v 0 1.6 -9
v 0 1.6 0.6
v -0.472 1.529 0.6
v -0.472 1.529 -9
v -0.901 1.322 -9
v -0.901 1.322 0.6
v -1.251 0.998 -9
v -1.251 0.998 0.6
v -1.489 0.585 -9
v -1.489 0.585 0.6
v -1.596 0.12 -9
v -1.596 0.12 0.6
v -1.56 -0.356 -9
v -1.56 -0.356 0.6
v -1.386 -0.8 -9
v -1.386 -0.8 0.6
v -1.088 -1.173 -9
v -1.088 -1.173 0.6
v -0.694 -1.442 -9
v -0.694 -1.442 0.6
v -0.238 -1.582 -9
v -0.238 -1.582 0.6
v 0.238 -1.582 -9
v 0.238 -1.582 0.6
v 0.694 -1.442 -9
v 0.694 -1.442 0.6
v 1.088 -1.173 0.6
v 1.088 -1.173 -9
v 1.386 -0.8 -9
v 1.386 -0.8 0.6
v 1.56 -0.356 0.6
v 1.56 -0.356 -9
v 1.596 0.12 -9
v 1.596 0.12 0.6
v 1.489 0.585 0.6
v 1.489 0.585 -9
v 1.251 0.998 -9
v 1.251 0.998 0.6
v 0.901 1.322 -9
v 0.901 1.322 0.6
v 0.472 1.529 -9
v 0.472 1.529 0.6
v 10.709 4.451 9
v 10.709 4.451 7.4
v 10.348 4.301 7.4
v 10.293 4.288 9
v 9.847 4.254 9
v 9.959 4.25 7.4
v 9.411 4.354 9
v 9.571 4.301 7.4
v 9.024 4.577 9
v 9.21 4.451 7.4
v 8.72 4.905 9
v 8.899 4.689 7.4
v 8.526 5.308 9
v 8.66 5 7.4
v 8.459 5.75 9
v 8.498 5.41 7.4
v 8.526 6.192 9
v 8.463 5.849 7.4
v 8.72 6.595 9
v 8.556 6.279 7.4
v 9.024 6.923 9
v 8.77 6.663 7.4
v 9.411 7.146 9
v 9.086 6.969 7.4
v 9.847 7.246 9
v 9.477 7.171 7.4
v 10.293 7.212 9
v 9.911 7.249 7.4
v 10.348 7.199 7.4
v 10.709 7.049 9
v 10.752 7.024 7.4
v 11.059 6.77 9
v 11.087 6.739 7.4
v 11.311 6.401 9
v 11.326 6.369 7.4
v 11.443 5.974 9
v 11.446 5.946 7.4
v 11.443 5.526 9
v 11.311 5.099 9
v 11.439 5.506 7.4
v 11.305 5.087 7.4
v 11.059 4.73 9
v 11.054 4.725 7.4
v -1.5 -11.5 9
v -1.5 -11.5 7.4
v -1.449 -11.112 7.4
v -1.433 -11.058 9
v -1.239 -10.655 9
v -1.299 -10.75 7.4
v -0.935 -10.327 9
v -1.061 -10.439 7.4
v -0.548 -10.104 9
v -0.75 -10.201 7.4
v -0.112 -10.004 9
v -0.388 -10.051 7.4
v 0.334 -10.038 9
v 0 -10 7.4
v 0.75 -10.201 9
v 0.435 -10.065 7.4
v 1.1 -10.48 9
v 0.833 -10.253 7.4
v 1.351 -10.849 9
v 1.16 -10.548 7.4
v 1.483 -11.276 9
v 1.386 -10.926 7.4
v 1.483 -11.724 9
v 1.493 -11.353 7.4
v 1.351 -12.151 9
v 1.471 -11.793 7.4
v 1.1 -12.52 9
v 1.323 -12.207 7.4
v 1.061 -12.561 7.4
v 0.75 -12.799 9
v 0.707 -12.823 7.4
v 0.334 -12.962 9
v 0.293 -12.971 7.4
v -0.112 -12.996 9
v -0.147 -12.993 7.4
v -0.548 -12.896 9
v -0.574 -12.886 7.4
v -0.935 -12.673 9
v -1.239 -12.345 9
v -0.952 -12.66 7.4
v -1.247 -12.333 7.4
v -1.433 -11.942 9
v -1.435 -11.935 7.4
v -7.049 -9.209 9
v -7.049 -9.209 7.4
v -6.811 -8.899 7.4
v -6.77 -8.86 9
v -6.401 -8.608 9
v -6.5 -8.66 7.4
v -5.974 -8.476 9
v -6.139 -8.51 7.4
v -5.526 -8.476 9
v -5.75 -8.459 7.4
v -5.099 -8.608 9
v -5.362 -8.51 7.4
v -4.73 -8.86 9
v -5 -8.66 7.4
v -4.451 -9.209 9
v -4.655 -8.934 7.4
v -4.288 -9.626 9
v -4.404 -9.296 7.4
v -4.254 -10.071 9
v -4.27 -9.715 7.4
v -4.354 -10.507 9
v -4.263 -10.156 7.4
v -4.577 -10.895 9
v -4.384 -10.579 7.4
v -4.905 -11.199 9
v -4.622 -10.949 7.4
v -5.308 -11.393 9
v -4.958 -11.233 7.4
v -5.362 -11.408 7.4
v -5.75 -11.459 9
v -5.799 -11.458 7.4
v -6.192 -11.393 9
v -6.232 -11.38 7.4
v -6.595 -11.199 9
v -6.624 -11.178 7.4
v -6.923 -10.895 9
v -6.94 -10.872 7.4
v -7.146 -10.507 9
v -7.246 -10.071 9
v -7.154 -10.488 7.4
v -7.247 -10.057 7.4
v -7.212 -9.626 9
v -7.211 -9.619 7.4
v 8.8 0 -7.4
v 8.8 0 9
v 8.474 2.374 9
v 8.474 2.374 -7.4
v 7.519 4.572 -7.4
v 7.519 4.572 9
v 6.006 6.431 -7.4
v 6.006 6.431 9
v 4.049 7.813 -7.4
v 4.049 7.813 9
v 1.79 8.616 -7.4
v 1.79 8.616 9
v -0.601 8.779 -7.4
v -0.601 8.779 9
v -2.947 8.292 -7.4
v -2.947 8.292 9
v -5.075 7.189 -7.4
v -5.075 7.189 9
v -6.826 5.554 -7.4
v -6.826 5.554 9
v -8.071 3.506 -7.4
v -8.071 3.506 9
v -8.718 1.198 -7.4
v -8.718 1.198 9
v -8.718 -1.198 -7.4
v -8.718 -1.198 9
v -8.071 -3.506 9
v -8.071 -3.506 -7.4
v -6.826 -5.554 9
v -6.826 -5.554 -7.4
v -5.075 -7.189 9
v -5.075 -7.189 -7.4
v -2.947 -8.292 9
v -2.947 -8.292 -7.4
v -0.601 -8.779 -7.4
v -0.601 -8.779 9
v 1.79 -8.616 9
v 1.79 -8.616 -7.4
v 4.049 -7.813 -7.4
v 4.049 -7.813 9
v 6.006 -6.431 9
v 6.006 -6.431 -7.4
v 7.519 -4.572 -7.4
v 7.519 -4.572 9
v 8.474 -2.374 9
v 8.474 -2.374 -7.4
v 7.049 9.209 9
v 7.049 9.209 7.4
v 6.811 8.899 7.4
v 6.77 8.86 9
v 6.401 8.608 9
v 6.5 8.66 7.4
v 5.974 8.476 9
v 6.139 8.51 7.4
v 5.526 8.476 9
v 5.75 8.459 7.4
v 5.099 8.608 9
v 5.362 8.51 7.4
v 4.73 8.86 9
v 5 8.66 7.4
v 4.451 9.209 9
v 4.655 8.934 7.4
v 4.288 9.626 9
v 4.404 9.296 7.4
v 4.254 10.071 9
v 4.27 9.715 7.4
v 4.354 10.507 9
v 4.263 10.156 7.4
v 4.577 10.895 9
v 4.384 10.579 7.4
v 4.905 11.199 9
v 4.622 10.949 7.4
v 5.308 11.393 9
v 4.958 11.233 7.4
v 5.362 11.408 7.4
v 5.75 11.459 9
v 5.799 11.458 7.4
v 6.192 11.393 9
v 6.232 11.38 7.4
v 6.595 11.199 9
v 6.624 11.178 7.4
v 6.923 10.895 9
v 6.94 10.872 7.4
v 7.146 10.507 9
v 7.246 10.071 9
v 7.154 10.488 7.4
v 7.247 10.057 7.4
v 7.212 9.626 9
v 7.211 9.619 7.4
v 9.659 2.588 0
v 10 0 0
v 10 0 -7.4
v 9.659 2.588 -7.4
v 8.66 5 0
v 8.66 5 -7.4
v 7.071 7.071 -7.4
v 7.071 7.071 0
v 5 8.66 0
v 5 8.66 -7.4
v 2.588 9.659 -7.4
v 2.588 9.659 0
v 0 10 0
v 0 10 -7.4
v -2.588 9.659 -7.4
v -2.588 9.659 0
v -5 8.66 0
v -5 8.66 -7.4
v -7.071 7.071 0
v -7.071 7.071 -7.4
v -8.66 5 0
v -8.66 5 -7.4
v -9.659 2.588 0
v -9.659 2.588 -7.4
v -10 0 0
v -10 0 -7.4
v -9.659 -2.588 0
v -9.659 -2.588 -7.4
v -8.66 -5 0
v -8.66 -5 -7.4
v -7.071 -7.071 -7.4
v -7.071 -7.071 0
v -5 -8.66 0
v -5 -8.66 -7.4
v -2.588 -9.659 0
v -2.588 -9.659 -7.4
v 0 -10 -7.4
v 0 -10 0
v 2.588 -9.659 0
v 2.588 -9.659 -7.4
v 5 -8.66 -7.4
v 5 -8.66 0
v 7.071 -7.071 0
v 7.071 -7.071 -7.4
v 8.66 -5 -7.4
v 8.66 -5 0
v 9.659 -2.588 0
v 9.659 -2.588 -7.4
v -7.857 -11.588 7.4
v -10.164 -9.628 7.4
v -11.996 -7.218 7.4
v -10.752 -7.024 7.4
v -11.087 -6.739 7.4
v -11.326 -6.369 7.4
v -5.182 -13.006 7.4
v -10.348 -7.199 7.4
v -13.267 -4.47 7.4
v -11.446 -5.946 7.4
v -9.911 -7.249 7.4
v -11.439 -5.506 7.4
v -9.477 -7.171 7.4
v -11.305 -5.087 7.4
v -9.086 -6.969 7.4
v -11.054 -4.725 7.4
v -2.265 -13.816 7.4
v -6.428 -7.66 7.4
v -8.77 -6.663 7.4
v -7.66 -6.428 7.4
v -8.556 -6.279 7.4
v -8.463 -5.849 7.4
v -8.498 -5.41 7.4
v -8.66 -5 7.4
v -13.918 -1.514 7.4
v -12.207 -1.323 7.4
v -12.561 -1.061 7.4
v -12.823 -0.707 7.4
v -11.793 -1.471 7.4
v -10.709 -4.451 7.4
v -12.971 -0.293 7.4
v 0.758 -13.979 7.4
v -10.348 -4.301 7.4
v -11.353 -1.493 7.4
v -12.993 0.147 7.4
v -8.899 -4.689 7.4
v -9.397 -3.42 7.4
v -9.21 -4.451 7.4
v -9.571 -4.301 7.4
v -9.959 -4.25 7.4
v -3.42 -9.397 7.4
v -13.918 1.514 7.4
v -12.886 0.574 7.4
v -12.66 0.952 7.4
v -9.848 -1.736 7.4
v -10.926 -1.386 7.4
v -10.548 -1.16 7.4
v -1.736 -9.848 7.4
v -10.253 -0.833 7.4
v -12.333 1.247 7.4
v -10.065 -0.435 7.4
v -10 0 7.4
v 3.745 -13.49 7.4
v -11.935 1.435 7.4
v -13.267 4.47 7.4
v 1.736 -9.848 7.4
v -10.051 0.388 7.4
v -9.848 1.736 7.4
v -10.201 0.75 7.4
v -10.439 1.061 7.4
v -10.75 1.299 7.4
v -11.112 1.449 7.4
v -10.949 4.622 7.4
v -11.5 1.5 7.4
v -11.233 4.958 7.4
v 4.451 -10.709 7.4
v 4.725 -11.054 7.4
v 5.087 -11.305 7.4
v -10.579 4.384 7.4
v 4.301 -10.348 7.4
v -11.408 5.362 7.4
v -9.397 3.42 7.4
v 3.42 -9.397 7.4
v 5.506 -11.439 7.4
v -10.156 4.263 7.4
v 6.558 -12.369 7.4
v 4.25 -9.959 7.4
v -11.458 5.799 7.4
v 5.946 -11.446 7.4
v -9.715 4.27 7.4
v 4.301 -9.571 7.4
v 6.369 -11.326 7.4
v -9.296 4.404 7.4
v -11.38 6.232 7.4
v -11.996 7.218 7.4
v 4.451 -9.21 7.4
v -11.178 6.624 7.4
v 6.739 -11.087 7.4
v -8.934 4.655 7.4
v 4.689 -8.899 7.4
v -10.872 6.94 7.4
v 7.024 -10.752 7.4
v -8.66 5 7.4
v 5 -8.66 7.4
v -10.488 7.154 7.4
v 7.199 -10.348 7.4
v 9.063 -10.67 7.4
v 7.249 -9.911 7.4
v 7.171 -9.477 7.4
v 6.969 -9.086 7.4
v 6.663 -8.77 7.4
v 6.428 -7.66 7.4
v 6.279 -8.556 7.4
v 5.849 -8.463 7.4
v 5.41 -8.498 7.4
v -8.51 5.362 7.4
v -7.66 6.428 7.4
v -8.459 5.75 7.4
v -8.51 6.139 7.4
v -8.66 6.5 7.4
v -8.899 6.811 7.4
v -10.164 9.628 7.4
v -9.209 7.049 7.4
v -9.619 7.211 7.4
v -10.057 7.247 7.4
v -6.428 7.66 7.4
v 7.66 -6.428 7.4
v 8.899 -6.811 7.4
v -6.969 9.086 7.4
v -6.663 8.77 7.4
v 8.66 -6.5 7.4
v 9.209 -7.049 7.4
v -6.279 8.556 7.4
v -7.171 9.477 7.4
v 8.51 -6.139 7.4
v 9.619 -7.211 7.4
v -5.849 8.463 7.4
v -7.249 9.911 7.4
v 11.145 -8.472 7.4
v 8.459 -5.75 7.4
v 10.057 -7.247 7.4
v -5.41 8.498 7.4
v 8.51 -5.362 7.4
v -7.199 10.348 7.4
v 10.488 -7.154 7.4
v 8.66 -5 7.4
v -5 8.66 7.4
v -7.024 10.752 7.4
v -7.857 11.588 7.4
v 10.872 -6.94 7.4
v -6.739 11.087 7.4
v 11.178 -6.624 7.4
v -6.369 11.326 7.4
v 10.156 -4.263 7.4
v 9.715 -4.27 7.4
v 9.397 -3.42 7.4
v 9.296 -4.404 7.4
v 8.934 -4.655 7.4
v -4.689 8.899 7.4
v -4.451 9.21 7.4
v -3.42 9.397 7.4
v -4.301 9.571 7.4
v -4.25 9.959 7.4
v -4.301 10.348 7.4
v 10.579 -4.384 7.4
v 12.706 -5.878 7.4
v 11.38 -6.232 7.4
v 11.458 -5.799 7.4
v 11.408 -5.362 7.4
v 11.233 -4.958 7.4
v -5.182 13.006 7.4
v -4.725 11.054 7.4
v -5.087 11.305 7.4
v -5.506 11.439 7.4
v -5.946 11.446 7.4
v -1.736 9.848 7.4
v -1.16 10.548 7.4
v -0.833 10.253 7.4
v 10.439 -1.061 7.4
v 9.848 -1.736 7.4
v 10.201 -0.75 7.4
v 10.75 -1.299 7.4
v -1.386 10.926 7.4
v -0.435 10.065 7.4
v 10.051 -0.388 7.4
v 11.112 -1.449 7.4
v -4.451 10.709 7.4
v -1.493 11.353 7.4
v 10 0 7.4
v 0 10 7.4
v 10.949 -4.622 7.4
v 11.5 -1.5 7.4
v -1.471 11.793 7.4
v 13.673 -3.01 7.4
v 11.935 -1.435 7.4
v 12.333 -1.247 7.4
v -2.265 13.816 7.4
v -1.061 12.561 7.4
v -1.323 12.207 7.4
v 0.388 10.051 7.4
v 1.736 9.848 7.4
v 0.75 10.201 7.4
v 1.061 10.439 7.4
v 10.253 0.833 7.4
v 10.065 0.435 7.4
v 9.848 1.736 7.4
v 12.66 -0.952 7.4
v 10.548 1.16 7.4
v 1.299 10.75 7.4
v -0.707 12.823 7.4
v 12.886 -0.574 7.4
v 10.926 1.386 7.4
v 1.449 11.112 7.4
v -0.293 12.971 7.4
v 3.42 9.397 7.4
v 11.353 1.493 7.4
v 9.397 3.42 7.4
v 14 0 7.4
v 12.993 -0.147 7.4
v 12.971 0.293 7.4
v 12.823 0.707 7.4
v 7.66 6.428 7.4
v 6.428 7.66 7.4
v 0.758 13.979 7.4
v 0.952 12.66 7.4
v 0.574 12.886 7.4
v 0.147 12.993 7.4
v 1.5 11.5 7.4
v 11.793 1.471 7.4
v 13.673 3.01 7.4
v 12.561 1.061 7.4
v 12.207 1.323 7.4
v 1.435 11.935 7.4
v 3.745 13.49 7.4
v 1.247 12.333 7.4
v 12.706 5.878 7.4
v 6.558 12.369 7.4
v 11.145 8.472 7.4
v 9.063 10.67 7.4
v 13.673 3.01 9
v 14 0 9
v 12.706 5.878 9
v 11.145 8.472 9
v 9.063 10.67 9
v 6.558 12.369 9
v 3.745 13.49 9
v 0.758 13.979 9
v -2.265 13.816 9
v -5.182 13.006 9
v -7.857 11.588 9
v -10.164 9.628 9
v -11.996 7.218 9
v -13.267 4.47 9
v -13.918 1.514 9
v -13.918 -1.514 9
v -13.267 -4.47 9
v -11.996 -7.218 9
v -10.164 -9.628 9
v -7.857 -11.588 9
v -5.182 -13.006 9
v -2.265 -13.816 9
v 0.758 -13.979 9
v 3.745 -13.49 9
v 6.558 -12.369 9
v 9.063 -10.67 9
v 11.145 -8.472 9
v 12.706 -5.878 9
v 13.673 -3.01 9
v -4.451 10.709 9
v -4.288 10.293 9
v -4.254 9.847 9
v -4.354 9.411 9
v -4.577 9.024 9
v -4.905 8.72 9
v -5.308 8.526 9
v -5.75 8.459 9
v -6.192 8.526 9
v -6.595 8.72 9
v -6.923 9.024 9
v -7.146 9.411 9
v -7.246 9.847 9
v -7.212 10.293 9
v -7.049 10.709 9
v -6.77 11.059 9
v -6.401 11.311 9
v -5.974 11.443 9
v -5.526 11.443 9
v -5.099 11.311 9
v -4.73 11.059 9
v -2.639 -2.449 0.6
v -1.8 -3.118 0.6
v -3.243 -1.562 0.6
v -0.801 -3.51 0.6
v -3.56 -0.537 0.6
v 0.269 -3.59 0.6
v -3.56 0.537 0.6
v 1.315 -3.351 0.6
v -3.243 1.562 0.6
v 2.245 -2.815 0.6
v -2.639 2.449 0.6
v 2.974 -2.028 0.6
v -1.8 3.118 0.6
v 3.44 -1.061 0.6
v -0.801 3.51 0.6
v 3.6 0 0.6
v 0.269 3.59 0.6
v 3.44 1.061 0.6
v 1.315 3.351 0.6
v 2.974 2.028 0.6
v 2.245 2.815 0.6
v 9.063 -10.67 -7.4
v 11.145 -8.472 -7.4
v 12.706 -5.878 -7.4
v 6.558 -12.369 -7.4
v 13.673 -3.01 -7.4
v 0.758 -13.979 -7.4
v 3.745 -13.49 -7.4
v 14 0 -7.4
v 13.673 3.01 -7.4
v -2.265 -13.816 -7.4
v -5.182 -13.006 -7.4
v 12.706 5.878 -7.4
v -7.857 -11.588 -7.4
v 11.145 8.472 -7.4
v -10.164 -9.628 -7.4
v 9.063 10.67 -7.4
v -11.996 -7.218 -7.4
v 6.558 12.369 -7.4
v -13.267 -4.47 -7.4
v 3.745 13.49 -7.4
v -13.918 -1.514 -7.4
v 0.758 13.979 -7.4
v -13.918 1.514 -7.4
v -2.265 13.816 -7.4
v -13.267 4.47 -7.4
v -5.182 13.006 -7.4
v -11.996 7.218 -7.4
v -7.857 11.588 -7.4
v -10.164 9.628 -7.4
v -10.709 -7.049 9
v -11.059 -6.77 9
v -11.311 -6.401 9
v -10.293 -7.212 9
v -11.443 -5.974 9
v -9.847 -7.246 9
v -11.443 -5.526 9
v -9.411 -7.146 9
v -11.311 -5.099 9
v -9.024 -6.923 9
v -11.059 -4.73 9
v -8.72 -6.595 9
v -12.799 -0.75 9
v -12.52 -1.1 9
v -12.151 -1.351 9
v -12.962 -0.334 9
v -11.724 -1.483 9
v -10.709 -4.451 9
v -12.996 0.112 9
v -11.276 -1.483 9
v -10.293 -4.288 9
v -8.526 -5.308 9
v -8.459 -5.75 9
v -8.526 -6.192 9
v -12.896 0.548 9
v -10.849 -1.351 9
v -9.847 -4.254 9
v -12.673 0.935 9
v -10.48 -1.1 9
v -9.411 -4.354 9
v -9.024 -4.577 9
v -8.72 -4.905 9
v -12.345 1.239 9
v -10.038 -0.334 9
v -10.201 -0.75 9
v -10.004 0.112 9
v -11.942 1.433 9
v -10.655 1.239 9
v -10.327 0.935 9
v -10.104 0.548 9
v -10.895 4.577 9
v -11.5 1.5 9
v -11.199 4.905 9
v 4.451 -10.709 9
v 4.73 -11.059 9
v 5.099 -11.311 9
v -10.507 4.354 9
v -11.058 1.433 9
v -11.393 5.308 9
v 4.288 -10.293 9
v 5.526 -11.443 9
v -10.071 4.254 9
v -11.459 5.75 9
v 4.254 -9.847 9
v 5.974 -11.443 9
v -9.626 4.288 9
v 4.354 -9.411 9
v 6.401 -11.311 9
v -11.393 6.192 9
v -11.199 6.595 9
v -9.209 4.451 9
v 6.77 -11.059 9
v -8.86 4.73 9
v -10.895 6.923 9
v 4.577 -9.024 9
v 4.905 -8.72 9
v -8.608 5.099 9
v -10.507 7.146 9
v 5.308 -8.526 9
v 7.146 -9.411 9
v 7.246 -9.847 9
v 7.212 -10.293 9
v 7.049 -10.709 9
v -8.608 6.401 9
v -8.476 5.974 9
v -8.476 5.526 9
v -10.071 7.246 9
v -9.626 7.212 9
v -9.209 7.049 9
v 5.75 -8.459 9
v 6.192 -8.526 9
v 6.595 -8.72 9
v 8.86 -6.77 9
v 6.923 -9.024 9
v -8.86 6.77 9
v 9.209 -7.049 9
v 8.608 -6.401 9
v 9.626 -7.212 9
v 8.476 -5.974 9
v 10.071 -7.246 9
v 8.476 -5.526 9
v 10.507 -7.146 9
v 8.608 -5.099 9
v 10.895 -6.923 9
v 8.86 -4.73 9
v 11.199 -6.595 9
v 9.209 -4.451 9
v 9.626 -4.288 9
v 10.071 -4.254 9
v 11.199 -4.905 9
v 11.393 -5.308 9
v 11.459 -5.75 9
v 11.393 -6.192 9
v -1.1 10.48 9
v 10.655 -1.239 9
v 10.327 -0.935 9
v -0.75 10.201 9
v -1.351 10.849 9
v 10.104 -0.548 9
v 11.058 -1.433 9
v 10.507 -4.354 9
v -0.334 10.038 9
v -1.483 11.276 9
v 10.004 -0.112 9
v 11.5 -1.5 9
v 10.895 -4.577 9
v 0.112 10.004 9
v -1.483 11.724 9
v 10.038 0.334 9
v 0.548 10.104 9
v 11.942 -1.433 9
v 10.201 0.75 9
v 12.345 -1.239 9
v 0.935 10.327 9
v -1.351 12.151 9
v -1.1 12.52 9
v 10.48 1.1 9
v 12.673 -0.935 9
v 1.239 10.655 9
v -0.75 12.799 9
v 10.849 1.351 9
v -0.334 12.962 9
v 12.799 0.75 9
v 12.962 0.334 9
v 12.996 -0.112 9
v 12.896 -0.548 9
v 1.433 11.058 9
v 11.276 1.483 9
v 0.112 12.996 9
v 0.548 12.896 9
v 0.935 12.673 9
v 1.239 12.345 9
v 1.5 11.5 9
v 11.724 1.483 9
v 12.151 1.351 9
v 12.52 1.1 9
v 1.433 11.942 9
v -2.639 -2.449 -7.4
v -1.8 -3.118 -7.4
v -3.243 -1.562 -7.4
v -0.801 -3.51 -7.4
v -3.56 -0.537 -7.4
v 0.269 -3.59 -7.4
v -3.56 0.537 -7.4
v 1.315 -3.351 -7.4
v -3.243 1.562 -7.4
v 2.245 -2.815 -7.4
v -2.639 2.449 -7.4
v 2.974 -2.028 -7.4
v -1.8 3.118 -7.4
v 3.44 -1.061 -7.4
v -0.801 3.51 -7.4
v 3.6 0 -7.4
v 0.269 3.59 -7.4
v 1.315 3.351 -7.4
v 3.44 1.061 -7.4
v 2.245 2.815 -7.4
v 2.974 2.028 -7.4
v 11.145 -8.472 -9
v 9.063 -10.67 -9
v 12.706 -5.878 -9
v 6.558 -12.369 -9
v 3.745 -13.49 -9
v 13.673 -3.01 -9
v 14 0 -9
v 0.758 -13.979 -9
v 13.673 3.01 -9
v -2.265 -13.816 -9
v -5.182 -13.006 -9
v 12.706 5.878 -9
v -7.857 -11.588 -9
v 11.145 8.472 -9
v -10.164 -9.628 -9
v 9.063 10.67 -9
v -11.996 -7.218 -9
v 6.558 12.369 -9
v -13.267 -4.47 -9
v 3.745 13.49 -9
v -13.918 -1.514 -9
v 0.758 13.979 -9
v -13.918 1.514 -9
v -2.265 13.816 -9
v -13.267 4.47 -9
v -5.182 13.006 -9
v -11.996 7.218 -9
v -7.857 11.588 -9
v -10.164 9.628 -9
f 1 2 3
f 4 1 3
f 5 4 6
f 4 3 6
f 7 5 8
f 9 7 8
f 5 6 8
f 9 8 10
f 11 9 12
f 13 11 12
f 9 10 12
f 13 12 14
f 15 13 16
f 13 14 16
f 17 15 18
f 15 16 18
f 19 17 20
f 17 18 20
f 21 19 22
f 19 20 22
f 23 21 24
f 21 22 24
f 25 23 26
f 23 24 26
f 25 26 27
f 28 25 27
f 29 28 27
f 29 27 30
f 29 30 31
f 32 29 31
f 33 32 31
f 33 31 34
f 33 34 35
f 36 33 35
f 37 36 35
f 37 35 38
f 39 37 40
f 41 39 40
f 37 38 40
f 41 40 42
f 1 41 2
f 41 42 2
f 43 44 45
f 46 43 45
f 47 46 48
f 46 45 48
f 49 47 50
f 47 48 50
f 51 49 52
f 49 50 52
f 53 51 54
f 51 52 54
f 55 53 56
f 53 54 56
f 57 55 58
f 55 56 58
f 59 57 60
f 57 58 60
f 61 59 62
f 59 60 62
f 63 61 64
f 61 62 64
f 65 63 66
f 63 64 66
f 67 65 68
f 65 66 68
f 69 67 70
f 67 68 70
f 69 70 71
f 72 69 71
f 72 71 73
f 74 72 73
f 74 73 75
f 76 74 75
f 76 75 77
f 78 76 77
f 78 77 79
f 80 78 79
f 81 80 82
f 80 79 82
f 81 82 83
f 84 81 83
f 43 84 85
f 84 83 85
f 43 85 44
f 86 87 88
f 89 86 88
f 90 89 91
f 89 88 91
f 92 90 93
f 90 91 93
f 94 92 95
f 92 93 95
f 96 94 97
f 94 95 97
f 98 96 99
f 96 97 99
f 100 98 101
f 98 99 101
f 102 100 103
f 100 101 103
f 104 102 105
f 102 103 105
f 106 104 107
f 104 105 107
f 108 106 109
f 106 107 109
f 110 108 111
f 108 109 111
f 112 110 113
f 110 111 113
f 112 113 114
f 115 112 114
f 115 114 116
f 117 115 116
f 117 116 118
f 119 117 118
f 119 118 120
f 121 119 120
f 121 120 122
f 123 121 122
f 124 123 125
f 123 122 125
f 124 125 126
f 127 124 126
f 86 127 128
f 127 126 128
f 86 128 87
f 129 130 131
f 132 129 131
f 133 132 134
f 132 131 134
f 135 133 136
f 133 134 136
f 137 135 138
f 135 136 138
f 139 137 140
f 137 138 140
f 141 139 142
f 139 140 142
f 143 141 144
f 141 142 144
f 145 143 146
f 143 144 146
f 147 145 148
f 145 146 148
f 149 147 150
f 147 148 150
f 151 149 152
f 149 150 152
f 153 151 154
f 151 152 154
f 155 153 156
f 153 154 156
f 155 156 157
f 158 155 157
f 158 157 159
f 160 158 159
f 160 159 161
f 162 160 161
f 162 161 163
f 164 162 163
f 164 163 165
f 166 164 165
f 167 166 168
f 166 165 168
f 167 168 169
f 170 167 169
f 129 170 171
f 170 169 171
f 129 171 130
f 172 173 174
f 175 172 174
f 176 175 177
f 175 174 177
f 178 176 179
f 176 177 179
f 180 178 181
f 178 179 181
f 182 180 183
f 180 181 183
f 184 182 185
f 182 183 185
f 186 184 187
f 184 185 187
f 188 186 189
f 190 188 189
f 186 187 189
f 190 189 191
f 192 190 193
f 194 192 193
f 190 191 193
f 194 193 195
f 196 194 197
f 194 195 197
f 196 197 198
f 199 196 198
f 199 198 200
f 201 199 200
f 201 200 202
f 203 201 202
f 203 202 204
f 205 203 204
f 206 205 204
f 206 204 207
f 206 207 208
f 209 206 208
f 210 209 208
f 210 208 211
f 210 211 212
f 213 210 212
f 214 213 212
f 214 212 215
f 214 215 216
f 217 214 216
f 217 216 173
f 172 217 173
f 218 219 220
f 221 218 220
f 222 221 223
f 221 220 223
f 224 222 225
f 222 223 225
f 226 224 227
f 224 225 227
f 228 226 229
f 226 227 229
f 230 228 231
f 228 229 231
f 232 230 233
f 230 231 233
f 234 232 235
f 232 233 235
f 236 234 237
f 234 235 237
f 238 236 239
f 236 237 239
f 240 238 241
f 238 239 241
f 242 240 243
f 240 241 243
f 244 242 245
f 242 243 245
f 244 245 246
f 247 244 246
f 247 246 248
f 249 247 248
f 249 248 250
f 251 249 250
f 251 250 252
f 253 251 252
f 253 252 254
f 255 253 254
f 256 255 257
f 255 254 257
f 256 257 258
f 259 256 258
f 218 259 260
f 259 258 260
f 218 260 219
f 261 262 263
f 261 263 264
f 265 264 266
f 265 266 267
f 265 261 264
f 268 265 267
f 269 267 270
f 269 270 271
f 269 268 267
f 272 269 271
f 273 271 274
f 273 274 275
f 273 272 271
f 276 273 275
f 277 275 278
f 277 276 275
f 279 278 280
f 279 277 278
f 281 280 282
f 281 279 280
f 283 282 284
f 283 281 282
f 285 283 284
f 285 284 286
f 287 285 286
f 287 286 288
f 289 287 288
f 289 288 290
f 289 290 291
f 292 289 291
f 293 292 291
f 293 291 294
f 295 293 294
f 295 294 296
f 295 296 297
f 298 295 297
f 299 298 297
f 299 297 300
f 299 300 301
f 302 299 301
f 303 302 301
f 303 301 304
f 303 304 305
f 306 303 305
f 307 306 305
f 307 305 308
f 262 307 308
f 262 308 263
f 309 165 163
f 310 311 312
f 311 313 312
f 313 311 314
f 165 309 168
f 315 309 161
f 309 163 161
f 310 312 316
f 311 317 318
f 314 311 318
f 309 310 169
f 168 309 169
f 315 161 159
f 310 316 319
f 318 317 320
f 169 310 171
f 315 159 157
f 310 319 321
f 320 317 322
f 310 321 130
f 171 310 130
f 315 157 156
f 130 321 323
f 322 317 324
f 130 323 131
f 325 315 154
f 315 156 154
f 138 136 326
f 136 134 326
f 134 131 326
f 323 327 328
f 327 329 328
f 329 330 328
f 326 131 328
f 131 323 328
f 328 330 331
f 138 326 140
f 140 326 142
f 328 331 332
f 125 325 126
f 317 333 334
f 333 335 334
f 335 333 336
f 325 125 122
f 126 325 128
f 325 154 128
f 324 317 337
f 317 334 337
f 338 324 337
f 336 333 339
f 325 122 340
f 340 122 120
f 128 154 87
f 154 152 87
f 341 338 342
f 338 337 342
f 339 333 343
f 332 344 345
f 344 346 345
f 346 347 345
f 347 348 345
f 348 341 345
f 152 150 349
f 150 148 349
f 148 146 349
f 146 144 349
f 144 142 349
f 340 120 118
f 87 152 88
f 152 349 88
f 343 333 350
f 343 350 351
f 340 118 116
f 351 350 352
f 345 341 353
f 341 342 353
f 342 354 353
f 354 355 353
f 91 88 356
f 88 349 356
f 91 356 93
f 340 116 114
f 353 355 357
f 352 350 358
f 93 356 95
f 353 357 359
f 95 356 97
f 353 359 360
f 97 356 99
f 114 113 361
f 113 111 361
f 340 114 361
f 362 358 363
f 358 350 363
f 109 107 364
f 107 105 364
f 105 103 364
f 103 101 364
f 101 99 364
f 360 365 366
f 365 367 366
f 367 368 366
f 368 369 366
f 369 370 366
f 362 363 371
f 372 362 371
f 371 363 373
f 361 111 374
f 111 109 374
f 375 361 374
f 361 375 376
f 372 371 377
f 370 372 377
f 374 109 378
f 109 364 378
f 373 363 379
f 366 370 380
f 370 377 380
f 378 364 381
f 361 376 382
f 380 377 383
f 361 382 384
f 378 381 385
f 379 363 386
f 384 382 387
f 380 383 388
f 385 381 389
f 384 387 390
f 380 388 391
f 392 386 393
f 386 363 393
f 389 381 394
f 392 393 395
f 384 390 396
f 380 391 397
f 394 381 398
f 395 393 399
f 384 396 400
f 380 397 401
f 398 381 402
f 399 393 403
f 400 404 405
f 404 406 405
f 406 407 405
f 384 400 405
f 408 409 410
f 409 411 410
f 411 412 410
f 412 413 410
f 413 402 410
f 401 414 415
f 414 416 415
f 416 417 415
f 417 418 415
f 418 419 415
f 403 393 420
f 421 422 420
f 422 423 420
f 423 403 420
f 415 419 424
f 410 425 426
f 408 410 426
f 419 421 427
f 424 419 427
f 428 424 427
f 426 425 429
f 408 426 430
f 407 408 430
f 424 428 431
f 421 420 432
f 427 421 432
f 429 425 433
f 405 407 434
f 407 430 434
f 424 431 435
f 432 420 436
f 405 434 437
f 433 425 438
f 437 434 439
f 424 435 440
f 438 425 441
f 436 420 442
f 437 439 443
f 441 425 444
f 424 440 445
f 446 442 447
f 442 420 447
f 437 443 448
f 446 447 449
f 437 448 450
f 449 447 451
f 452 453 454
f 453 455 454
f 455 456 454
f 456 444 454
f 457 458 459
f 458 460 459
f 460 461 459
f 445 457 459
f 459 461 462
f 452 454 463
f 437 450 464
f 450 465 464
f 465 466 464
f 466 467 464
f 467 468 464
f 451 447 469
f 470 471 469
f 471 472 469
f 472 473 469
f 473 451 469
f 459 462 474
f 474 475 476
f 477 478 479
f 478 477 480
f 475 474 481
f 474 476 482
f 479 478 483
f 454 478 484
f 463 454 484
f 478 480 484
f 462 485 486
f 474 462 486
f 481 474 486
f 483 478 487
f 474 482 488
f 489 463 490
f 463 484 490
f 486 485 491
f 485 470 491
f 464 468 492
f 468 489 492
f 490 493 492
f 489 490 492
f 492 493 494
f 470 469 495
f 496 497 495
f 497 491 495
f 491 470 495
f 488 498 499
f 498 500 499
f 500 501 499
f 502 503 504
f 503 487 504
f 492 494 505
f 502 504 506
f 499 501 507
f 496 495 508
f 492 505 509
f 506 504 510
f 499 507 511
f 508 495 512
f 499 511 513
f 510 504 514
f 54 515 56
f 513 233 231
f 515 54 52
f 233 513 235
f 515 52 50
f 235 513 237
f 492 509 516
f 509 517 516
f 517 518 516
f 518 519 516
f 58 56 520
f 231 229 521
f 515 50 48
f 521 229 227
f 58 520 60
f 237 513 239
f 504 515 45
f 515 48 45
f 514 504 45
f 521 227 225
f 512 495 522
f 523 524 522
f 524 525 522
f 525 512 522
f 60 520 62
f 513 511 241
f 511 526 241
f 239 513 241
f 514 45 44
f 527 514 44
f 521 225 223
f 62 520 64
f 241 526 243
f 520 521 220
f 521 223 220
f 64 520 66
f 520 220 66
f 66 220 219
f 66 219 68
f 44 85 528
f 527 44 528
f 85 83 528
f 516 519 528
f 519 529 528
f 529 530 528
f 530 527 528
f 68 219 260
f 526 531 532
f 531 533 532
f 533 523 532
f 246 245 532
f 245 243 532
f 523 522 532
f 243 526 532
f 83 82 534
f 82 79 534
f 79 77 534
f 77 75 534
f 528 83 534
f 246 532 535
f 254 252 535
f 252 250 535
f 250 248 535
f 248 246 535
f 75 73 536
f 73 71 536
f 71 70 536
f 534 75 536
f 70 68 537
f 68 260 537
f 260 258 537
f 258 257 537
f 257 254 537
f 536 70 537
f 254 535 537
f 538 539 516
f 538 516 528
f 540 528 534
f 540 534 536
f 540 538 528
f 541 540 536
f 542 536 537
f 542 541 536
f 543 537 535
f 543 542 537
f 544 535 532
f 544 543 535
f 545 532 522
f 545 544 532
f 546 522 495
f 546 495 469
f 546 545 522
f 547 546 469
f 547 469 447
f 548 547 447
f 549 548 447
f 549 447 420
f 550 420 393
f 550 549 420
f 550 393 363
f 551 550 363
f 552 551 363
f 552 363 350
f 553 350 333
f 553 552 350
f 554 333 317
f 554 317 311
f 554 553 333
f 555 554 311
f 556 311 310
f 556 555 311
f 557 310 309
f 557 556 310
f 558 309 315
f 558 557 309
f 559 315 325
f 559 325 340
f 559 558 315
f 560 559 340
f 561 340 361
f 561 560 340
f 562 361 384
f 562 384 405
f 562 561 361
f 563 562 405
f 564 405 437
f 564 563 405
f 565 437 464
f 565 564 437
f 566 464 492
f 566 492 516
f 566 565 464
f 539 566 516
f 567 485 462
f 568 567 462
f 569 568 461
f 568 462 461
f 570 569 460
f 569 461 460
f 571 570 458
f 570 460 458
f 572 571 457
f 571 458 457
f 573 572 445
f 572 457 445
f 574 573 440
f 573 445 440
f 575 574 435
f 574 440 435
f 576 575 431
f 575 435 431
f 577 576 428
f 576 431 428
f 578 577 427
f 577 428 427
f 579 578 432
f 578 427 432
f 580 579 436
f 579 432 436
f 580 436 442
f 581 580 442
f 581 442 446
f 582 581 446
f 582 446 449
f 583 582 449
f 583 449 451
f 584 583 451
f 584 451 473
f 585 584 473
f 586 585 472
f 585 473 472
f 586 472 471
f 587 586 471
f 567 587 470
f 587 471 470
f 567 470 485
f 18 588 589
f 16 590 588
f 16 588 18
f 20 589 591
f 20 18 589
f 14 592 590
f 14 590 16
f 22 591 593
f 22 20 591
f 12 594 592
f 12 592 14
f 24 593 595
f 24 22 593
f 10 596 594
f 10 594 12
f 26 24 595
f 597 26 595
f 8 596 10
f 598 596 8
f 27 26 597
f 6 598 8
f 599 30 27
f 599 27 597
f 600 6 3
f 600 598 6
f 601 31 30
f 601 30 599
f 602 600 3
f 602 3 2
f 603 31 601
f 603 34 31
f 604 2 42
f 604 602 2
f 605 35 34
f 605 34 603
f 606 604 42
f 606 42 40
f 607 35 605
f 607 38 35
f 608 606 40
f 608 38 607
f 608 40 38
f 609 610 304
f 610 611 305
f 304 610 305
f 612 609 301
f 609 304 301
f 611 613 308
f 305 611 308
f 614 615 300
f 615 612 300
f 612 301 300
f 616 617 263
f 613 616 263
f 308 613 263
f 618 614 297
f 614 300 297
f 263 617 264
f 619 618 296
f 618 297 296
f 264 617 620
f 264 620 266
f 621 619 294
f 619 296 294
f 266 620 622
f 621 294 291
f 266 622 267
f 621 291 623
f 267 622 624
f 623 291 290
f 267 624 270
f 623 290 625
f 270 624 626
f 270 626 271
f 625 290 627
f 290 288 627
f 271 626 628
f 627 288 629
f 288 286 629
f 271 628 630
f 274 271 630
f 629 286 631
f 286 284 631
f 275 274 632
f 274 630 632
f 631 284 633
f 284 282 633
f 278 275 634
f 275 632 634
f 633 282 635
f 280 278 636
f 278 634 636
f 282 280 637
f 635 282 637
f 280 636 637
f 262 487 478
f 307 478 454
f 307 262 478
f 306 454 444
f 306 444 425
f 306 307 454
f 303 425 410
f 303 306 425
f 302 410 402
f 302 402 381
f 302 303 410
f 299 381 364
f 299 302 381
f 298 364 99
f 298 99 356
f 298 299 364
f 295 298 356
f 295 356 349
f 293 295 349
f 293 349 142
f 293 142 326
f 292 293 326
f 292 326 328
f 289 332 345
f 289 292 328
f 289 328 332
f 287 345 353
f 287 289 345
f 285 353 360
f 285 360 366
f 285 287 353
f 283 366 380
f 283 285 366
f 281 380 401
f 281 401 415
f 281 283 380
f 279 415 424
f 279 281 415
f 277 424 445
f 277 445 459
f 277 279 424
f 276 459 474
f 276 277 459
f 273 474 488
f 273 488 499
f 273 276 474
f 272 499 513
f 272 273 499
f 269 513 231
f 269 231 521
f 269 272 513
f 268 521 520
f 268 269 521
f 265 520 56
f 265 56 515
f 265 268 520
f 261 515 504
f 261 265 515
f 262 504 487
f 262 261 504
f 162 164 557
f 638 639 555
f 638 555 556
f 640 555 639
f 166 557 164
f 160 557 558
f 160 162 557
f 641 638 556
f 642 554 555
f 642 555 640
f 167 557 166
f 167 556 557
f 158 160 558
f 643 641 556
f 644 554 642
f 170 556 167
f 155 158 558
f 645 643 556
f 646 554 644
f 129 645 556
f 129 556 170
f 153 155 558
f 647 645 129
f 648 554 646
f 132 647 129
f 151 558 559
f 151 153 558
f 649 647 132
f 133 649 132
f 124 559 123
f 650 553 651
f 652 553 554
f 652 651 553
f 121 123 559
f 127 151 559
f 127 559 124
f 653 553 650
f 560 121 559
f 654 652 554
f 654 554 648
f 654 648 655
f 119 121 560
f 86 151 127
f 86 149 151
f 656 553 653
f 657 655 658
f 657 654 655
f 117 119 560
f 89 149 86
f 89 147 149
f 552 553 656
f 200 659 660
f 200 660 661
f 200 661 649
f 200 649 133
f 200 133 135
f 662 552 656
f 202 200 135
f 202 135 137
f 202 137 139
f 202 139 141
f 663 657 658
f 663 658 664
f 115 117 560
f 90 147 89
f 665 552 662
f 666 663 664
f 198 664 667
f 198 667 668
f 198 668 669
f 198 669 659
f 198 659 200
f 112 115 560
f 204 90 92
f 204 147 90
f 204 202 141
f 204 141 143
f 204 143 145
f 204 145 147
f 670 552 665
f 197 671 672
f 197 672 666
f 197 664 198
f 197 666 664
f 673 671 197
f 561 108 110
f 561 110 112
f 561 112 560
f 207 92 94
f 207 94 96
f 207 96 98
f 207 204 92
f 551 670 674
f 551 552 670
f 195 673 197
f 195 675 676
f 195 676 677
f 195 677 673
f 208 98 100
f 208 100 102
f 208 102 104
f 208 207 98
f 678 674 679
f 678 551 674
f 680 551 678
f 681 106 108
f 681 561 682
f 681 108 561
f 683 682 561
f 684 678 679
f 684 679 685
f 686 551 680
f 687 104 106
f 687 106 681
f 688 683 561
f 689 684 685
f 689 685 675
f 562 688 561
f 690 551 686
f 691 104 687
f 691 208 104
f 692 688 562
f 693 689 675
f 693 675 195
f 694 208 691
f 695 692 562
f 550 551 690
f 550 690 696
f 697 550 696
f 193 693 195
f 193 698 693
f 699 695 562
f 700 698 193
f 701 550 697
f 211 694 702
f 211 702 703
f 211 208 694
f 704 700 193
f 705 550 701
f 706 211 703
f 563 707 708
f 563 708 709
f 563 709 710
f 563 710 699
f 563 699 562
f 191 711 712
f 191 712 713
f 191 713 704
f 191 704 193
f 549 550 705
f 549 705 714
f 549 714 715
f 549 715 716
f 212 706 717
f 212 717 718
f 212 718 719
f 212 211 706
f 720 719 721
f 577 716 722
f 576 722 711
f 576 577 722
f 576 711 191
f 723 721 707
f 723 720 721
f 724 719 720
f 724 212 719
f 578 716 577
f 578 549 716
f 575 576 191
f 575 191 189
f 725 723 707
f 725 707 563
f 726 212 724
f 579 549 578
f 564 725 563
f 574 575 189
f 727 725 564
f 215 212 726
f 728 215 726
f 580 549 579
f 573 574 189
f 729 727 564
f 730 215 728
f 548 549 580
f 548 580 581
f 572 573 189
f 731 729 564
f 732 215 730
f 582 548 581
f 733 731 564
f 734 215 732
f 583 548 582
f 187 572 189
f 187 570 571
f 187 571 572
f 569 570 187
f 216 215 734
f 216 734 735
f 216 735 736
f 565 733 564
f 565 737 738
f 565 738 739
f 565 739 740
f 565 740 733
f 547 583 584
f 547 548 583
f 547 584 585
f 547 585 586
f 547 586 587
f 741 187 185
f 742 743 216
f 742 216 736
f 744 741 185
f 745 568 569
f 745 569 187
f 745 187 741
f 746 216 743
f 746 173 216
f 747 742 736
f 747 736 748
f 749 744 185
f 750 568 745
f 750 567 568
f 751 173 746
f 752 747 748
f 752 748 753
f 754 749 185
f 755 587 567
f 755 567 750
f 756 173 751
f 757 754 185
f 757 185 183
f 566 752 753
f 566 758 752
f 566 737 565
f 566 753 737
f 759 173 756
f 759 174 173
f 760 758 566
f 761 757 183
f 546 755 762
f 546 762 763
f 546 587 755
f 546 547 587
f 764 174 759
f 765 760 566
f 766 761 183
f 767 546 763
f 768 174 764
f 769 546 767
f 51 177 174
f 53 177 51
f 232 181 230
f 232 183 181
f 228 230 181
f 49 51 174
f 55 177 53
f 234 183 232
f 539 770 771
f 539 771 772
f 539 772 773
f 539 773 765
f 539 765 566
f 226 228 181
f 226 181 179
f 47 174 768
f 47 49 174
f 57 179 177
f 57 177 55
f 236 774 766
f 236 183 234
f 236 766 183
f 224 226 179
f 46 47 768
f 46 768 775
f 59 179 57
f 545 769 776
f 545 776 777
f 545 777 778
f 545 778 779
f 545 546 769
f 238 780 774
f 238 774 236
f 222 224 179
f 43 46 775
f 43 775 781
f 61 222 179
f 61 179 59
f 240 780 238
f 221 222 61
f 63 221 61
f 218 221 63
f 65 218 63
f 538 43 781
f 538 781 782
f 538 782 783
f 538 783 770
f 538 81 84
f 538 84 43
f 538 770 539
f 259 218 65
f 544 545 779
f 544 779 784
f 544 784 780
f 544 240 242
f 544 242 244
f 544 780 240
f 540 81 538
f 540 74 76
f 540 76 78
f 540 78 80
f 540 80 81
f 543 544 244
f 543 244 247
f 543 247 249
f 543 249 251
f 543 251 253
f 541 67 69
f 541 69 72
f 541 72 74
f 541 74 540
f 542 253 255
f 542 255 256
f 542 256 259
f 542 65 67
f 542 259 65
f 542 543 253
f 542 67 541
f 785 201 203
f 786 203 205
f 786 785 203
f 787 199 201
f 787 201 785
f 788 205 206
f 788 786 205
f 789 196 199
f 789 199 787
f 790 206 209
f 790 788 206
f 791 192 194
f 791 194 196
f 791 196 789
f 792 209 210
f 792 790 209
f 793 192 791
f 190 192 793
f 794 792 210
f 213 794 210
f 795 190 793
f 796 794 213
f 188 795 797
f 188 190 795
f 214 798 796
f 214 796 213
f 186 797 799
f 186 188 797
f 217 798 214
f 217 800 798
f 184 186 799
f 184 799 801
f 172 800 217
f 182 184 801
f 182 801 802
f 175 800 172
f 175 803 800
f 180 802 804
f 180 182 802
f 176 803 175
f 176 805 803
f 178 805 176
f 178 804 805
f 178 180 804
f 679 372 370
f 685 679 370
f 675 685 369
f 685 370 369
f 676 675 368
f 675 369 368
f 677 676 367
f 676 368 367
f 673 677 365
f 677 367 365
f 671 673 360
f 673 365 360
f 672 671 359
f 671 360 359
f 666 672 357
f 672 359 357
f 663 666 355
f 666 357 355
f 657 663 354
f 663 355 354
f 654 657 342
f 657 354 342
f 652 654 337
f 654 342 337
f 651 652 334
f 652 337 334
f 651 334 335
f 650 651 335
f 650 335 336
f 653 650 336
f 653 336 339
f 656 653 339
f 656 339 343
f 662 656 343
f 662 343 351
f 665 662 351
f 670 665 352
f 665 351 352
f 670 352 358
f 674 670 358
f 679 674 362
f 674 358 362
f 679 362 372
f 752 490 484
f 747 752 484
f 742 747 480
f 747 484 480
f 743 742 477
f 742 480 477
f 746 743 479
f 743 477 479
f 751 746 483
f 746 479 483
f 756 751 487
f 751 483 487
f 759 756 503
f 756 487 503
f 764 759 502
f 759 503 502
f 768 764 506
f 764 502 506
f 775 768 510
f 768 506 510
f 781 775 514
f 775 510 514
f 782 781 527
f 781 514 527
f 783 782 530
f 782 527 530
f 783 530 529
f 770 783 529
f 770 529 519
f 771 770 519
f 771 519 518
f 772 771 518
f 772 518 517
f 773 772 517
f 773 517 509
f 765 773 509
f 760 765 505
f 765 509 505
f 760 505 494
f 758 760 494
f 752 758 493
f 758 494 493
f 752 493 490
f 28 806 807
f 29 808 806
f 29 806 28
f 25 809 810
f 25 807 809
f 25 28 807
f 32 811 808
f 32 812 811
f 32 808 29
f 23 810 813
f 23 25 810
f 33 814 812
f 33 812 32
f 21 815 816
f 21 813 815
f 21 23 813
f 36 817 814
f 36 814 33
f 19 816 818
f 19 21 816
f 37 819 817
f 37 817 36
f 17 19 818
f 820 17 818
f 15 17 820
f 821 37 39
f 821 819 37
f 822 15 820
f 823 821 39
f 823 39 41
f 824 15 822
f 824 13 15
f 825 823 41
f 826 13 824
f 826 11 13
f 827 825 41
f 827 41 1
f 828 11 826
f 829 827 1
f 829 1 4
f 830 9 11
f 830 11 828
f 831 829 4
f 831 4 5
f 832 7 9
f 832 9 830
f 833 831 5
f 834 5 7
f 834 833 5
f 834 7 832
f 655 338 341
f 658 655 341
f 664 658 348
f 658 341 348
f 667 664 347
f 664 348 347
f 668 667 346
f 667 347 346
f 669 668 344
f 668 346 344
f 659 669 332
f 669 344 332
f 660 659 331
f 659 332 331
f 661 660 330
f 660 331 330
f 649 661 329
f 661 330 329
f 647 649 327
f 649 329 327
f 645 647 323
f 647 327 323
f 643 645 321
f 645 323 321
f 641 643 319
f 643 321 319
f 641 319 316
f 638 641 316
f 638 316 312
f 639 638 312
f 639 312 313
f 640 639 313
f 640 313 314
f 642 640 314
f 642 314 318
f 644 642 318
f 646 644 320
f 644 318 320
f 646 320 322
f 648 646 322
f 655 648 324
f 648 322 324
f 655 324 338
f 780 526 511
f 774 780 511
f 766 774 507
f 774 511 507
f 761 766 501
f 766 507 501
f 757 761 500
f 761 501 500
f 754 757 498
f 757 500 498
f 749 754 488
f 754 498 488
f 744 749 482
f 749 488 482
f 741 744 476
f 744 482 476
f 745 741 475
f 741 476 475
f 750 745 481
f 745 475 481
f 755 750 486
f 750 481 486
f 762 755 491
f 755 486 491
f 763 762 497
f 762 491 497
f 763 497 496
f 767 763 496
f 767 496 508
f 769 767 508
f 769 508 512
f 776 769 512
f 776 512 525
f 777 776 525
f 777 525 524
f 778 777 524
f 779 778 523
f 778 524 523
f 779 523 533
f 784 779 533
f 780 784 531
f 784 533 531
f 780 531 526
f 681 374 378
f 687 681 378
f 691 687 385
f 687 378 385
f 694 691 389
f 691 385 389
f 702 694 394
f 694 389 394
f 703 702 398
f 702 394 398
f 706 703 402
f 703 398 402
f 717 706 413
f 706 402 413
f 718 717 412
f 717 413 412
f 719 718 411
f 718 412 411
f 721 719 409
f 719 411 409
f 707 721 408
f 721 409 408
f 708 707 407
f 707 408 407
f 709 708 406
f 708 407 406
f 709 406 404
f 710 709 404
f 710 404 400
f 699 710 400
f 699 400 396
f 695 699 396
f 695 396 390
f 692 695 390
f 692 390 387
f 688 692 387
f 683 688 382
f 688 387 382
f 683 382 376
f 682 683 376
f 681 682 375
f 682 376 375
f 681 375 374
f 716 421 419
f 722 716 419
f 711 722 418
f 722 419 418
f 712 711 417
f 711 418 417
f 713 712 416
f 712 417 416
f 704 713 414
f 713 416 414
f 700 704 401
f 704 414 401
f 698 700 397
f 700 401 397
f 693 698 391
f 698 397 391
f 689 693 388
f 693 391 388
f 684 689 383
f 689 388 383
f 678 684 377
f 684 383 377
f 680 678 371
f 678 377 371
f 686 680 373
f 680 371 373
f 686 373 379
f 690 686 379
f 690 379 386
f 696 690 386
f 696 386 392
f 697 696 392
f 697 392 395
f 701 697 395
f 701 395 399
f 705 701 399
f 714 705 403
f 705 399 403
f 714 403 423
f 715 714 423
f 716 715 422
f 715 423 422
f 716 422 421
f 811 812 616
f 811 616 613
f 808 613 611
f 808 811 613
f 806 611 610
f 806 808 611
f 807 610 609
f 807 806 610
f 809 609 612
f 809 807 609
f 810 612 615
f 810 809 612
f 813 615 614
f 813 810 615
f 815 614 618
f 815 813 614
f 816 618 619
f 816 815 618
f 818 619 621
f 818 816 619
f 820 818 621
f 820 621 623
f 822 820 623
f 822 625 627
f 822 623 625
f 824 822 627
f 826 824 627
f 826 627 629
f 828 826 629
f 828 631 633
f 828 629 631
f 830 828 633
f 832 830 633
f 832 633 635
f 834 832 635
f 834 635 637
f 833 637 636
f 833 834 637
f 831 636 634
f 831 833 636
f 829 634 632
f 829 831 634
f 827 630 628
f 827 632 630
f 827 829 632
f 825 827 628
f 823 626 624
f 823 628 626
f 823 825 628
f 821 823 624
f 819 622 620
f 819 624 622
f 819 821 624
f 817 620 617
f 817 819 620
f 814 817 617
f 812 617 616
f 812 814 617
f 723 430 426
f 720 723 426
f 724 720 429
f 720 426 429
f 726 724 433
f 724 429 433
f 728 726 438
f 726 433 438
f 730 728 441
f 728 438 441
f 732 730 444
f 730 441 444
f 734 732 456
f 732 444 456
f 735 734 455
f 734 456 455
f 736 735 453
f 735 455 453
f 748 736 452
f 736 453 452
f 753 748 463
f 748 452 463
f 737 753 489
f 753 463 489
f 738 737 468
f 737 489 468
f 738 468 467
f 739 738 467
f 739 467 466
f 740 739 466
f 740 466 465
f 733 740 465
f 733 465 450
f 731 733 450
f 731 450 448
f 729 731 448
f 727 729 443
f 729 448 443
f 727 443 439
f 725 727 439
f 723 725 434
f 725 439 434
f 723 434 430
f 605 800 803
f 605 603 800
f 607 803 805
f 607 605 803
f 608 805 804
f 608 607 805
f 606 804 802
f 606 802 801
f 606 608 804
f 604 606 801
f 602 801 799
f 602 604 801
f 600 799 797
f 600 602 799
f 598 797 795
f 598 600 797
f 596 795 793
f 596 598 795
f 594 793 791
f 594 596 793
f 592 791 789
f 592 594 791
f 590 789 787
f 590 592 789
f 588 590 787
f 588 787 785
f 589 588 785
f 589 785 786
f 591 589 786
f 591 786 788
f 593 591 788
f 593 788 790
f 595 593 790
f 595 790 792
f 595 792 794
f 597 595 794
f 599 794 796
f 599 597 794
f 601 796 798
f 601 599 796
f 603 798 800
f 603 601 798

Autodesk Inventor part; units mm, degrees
ref_plane "YZ Plane" through (0, 0, 0) normal (1, 0, 0) x (0, 1, 0)
ref_plane "XZ Plane" through (0, 0, 0) normal (0, 1, 0) x (-1, 0, 0)
ref_plane "XY Plane" through (0, 0, 0) normal (0, 0, 1) x (1, 0, 0)
sketch "Sketch1" plane through (0, 0, 0) normal (0, 0, 1) x (1, 0, 0)
  circle A0 centre (0, 0) radius 10
  dimension "d0" = 20
extrude "Extrusion1" add sketch "Sketch1" along normal mid plane 18
sketch "Sketch2" plane through (0, 0, -9) normal (0, 0, -1) x (-1, 0, 0)
  point P0 (0, 0)
hole "Hole1" at (0, 0, -9) direction (0, 0, 1) diameter 3.2 end through all clearance for "Flat Head Machine Screw" size "M3" standard "Ansi Metric M Profile"
sketch "Sketch3" plane through (0, 0, 9) normal (0, 0, 1) x (1, 0, 0)
  circle A0 centre (0, 0) radius 14
  circle A1 centre (0, 0) radius 10 projected
  dimension "d10" = 28
extrude "Extrusion2" add sketch "Sketch3" against normal blind 1.6
mirror "Mirror1" about plane through (0, 0, 0) normal (0, 0, 1) of "Extrusion2"
sketch "Sketch4" plane through (0, 0, 9) normal (0, 0, 1) x (1, 0, 0)
  circle A0 centre (0, 0) radius 10 projected
  circle A1 centre (0, 0) radius 10 projected
  circle A2 centre (0, 0) radius 1.6 projected
  circle A3 centre (0, 0) radius 8.8
  circle A4 centre (0, 0) radius 3.6
  dimension "d13" = 1.2
  dimension "d14" = 2
extrude "Extrusion3" cut sketch "Sketch4" against normal up to surface (16.4 mm away) contours A3
sketch "Sketch5" plane through (0, 0, 9) normal (0, 0, 1) x (1, 0, 0)
  circle A0 centre (0, 0) radius 3.6 projected
extrude "Extrusion4" cut sketch "Sketch5" against normal blind 8.4
sketch "Sketch8" plane through (0, 0, 7.4) normal (0, 0, 1) x (1, 0, 0)
  line L0 (0, -19.6) -> (0, 19.6) projected
  circle A0 centre (0, 0) radius 10 projected
  circle A1 centre (0, 11.5) radius 1.5
  dimension "d36" = 3
extrude "Extrusion6" cut sketch "Sketch8" along normal through all contours A1 L0 | L0 A1
pattern_circular "Circular Pattern1" count 12 over 360 about axis through (0, 0, -10) along (0, 0, 1) of "Extrusion6"
properties part number "SpoolTraditionalMachining"
